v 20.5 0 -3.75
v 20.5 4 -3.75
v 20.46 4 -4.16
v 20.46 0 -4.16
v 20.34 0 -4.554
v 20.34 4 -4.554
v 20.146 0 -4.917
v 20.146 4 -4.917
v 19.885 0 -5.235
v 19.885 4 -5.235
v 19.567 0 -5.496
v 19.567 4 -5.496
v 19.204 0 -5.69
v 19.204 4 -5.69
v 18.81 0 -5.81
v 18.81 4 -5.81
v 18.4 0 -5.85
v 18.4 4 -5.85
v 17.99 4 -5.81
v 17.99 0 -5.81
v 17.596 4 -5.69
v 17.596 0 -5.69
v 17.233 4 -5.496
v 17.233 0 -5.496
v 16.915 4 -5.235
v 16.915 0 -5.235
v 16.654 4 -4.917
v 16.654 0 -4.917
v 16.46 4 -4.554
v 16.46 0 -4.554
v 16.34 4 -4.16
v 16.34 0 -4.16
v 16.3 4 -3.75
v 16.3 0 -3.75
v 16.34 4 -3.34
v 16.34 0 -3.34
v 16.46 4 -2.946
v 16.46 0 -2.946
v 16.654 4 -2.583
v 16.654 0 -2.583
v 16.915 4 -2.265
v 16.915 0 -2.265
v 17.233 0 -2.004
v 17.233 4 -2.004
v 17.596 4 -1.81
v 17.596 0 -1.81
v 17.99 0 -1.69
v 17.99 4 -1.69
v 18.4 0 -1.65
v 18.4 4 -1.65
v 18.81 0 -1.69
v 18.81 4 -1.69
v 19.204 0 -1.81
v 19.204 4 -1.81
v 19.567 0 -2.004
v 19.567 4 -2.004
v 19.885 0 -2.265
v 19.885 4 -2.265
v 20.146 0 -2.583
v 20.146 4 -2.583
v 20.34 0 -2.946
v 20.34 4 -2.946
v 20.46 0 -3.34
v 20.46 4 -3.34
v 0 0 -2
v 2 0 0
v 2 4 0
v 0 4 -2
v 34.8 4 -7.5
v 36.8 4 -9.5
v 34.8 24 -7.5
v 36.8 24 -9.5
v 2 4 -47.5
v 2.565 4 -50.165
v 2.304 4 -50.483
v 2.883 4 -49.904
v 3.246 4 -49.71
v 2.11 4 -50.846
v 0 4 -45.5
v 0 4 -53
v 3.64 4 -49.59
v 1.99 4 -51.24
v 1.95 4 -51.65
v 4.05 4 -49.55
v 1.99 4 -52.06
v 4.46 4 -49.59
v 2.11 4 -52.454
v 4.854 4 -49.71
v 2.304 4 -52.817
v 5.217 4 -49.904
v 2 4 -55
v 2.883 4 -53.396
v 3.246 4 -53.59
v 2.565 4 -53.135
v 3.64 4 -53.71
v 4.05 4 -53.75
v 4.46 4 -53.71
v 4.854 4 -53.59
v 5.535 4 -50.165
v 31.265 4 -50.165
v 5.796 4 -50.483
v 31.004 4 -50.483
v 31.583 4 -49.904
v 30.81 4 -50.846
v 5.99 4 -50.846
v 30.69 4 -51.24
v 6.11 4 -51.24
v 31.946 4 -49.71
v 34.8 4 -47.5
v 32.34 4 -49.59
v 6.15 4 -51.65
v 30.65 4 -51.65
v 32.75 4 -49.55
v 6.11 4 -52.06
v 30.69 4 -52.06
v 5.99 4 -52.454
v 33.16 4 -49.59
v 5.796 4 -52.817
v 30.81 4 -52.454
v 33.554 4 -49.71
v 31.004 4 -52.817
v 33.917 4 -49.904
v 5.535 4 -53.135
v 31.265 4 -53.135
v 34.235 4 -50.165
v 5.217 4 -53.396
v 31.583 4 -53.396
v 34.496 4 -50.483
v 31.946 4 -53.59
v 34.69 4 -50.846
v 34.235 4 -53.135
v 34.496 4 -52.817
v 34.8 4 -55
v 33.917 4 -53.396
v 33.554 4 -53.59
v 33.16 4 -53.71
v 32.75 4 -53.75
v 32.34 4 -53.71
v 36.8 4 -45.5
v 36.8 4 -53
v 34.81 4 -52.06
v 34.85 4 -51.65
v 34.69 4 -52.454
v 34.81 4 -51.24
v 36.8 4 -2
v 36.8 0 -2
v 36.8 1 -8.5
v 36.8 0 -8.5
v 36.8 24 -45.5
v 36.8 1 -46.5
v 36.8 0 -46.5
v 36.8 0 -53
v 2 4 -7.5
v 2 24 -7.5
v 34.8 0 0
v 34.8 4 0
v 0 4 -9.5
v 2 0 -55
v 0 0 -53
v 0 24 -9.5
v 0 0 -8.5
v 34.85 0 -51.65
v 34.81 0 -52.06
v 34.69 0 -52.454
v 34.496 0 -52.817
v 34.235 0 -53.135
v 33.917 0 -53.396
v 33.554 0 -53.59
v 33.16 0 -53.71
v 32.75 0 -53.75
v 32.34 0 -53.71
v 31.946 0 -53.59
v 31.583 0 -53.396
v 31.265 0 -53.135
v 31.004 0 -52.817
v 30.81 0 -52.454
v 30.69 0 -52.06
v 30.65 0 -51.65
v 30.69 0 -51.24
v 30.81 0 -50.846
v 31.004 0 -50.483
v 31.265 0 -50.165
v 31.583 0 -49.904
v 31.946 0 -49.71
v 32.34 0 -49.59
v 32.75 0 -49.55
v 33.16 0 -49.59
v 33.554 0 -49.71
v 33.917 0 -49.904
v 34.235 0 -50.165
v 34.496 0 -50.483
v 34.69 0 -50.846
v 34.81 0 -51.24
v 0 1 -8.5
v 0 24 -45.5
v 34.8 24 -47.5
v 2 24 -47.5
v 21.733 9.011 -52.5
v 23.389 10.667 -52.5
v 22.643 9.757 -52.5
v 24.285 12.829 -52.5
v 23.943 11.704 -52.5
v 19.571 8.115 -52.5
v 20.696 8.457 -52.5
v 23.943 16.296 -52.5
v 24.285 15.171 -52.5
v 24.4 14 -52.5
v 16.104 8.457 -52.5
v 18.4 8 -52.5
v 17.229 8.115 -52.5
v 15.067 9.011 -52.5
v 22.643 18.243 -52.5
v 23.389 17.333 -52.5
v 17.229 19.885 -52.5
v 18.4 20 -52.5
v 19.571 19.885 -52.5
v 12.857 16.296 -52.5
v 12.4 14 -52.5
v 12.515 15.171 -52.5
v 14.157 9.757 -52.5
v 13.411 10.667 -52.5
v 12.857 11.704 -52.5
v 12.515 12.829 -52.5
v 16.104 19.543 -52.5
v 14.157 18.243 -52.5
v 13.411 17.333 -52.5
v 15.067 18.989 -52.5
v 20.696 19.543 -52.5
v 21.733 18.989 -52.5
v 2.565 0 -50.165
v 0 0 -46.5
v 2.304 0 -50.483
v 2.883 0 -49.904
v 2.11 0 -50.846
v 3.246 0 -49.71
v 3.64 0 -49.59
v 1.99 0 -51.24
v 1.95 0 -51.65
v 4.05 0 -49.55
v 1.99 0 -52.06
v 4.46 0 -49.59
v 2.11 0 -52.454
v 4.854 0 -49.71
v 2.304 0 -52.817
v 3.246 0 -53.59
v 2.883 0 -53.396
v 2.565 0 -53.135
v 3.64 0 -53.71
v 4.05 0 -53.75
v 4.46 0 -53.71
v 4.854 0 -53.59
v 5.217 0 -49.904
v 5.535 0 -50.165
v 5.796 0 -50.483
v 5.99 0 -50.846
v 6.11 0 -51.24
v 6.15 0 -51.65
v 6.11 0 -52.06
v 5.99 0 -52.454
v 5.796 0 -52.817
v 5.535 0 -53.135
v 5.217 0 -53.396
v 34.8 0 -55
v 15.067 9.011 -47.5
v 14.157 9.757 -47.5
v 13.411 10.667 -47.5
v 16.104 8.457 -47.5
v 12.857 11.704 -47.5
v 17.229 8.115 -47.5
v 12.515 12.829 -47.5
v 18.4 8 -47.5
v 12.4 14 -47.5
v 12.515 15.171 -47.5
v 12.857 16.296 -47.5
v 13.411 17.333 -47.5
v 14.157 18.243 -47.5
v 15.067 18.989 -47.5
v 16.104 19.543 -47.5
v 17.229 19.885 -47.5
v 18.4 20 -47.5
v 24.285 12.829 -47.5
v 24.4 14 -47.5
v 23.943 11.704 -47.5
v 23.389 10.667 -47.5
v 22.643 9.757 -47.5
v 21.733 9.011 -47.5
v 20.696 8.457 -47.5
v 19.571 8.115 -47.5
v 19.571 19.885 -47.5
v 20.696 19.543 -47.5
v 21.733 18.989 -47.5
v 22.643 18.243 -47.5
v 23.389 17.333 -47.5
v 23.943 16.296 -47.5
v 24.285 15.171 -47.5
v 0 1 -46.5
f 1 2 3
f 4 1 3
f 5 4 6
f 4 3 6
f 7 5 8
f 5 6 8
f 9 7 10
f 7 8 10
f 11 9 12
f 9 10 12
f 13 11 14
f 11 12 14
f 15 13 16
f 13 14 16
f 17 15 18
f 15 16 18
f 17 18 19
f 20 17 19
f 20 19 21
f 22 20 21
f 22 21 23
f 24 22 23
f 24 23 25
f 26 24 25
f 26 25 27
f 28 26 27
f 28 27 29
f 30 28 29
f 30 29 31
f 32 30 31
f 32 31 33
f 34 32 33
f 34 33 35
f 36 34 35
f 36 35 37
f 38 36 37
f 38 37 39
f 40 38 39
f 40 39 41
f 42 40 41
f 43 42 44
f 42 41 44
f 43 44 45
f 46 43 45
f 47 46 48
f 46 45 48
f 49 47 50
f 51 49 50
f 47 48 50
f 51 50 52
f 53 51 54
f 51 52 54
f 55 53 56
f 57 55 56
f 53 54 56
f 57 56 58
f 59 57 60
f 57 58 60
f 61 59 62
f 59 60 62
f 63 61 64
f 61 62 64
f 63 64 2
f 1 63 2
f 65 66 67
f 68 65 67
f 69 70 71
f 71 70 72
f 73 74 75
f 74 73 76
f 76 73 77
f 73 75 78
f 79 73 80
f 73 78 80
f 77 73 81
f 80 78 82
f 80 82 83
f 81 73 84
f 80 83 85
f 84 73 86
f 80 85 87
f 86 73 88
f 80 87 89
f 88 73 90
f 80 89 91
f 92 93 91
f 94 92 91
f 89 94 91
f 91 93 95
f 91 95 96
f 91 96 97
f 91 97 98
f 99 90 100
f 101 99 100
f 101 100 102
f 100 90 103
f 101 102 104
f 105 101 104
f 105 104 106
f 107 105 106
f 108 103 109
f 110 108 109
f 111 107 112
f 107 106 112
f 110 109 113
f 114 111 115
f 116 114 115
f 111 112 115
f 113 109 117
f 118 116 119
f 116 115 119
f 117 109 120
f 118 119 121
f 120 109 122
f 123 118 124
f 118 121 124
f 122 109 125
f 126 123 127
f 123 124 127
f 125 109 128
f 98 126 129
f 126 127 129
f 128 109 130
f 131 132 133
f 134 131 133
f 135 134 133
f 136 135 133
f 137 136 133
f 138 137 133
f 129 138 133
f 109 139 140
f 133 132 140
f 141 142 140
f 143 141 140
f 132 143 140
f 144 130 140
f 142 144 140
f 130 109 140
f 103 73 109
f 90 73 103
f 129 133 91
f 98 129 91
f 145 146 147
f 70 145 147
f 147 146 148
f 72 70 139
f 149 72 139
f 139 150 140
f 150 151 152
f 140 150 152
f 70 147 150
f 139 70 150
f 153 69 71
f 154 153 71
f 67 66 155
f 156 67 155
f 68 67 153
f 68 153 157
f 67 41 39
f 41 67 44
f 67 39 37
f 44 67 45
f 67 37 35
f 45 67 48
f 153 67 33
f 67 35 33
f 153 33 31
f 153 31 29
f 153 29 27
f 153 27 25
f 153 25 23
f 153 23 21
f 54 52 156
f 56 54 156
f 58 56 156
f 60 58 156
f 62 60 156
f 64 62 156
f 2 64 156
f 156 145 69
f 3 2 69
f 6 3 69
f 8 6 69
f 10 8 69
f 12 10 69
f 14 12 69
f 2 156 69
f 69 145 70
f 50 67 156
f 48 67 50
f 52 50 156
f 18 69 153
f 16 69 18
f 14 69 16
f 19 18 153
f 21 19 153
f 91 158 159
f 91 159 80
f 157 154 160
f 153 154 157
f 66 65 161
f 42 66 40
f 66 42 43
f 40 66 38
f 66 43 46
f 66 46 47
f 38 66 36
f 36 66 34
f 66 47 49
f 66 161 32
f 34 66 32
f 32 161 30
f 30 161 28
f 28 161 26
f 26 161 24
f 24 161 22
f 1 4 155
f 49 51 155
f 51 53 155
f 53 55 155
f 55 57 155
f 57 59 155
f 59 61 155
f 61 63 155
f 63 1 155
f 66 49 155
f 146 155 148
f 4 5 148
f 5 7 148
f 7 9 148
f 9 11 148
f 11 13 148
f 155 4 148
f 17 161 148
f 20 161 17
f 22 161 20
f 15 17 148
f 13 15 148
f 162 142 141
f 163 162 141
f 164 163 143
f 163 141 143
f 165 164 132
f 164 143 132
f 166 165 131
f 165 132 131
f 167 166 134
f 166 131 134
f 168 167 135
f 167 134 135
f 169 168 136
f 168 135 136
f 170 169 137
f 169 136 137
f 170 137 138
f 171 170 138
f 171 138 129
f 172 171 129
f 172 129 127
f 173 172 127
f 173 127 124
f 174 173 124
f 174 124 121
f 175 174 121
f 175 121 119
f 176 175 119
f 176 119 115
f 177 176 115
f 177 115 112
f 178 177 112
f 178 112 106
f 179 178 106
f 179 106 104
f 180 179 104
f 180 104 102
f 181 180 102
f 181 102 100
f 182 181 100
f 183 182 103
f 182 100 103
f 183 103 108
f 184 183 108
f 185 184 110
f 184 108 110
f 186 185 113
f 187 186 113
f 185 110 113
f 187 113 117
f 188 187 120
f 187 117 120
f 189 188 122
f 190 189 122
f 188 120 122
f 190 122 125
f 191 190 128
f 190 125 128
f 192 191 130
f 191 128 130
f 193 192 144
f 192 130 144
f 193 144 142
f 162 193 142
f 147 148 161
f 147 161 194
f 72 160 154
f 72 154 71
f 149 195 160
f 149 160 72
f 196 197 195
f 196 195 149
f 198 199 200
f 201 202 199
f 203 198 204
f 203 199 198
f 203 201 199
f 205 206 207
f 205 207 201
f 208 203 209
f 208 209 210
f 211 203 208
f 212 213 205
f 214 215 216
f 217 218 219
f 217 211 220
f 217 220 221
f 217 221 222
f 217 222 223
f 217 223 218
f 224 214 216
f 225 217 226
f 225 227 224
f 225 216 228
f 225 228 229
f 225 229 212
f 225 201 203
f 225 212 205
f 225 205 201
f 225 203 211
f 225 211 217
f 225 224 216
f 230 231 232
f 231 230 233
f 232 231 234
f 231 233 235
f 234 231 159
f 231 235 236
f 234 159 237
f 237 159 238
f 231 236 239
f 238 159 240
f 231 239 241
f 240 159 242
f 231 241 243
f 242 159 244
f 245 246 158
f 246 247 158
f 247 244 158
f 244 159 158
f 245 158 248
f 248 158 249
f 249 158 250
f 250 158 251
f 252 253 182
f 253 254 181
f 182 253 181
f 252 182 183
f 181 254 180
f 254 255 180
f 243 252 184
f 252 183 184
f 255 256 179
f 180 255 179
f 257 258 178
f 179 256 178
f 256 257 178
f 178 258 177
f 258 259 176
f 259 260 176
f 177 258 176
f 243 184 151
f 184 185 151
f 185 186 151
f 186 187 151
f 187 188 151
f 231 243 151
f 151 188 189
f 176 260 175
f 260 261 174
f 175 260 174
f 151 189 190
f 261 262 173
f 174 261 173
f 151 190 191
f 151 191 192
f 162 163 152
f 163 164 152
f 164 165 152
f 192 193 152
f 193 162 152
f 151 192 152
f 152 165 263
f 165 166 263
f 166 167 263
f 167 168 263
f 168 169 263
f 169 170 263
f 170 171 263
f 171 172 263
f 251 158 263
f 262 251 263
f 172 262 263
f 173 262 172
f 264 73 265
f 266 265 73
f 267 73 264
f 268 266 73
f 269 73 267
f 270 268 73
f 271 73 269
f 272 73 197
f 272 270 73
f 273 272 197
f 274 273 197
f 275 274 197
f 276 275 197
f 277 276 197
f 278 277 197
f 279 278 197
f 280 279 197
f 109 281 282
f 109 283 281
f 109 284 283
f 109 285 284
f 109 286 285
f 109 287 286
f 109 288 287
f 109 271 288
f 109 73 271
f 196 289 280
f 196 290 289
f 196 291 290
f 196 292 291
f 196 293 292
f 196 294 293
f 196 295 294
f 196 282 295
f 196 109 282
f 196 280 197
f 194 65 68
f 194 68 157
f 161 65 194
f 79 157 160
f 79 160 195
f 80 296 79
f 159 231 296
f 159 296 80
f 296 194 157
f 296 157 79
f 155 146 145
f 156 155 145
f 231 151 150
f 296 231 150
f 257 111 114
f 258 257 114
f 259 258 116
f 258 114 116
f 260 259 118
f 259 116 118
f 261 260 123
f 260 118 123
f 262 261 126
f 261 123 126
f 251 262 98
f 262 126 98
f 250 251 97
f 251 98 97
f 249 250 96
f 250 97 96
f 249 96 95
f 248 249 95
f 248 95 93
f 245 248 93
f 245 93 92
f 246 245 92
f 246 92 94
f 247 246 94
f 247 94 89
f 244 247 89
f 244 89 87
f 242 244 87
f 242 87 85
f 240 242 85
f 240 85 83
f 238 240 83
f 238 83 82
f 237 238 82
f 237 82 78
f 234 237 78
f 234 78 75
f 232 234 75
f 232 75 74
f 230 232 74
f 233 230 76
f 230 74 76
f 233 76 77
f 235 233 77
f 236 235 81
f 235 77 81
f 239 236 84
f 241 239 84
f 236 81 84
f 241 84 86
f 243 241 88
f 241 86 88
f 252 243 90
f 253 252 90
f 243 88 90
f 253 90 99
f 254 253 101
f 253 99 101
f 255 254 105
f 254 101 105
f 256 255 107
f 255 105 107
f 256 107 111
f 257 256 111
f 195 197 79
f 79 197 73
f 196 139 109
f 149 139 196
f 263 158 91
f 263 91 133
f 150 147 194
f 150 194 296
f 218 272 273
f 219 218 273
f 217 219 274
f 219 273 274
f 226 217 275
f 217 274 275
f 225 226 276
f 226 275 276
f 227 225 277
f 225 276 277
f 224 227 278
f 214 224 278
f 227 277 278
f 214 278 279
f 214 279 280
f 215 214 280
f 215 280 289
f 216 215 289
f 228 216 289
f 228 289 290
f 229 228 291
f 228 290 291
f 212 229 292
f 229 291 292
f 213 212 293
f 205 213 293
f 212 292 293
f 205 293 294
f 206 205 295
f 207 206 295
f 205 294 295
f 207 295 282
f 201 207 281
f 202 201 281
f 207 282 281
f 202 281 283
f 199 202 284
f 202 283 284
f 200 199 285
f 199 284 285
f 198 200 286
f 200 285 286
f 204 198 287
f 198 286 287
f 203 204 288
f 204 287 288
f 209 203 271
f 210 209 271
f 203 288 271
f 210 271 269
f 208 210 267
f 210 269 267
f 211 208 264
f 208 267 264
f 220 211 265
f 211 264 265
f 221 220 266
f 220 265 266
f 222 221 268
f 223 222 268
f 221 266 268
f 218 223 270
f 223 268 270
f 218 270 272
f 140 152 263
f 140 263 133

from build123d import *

# Parameters (mm, degrees)
SKETCH3_W           = 36.8
SKETCH3_H           = 55
BOSS_EXTRUDE2_DEPTH = 24
SKETCH4_W           = 38
SKETCH4_H           = 1
SKETCH4_W_2         = 7.5
SKETCH4_H_2         = 20
CUT_EXTRUDE1_DEPTH  = 37.8
SKETCH5_R           = 2.1
CUT_EXTRUDE2_DEPTH  = 5
CHAMFER1_SIZE       = 2
SKETCH6_R           = 6
BOSS_EXTRUDE3_DEPTH = 5


with BuildPart() as part:
    # Sketch3 → Boss-Extrude2 (new body)
    with BuildSketch(Plane(origin=(0, 0, 0), x_dir=(1, 0, 0), z_dir=(0, 1, 0))):
        with Locations((18.4, 27.5)):
            Rectangle(SKETCH3_W, SKETCH3_H)
    extrude(amount=BOSS_EXTRUDE2_DEPTH)

    # Sketch4 → Cut-Extrude1 (cut, through all)
    with BuildSketch(Plane(origin=(36.8, 0, 0), x_dir=(0, 0, -1), z_dir=(1, 0, 0))):
        with Locations((27.5, 0.5)):
            Rectangle(SKETCH4_W, SKETCH4_H)
        with Locations((51.25, 14)):
            Rectangle(SKETCH4_W_2, SKETCH4_H_2)
        with Locations((3.75, 14)):
            Rectangle(SKETCH4_W_2, SKETCH4_H_2)
    extrude(amount=-CUT_EXTRUDE1_DEPTH, mode=Mode.SUBTRACT)

    # Sketch5 → Cut-Extrude2 (cut, through all)
    with BuildSketch(Plane(origin=(0, 4, 0), x_dir=(1, 0, 0), z_dir=(0, 1, 0))):
        with Locations((18.4, 3.75)):
            Circle(SKETCH5_R)
        with Locations((32.75, 51.65)):
            Circle(SKETCH5_R)
        with Locations((4.05, 51.65)):
            Circle(SKETCH5_R)
    extrude(amount=-CUT_EXTRUDE2_DEPTH, mode=Mode.SUBTRACT)

    # Chamfer1
    chamfer1_edges = [part.edges().sort_by_distance(p)[0] for p in [
        (0, 2, -55),
        (36.8, 2, -55),
        (36.8, 2, 0),
        (0, 2, 0),
        (0, 14, -47.5),
        (36.8, 14, -47.5),
        (0, 14, -7.5),
        (36.8, 14, -7.5),
    ]]
    chamfer(chamfer1_edges, length=CHAMFER1_SIZE)

    # Sketch6 → Boss-Extrude3 (add)
    with BuildSketch(Plane(origin=(0, 0, -47.5), x_dir=(-1, 0, 0), z_dir=(0, 0, -1))):
        with Locations((-18.4, 14)):
            Circle(SKETCH6_R)
    extrude(amount=BOSS_EXTRUDE3_DEPTH)


solid = part.part
